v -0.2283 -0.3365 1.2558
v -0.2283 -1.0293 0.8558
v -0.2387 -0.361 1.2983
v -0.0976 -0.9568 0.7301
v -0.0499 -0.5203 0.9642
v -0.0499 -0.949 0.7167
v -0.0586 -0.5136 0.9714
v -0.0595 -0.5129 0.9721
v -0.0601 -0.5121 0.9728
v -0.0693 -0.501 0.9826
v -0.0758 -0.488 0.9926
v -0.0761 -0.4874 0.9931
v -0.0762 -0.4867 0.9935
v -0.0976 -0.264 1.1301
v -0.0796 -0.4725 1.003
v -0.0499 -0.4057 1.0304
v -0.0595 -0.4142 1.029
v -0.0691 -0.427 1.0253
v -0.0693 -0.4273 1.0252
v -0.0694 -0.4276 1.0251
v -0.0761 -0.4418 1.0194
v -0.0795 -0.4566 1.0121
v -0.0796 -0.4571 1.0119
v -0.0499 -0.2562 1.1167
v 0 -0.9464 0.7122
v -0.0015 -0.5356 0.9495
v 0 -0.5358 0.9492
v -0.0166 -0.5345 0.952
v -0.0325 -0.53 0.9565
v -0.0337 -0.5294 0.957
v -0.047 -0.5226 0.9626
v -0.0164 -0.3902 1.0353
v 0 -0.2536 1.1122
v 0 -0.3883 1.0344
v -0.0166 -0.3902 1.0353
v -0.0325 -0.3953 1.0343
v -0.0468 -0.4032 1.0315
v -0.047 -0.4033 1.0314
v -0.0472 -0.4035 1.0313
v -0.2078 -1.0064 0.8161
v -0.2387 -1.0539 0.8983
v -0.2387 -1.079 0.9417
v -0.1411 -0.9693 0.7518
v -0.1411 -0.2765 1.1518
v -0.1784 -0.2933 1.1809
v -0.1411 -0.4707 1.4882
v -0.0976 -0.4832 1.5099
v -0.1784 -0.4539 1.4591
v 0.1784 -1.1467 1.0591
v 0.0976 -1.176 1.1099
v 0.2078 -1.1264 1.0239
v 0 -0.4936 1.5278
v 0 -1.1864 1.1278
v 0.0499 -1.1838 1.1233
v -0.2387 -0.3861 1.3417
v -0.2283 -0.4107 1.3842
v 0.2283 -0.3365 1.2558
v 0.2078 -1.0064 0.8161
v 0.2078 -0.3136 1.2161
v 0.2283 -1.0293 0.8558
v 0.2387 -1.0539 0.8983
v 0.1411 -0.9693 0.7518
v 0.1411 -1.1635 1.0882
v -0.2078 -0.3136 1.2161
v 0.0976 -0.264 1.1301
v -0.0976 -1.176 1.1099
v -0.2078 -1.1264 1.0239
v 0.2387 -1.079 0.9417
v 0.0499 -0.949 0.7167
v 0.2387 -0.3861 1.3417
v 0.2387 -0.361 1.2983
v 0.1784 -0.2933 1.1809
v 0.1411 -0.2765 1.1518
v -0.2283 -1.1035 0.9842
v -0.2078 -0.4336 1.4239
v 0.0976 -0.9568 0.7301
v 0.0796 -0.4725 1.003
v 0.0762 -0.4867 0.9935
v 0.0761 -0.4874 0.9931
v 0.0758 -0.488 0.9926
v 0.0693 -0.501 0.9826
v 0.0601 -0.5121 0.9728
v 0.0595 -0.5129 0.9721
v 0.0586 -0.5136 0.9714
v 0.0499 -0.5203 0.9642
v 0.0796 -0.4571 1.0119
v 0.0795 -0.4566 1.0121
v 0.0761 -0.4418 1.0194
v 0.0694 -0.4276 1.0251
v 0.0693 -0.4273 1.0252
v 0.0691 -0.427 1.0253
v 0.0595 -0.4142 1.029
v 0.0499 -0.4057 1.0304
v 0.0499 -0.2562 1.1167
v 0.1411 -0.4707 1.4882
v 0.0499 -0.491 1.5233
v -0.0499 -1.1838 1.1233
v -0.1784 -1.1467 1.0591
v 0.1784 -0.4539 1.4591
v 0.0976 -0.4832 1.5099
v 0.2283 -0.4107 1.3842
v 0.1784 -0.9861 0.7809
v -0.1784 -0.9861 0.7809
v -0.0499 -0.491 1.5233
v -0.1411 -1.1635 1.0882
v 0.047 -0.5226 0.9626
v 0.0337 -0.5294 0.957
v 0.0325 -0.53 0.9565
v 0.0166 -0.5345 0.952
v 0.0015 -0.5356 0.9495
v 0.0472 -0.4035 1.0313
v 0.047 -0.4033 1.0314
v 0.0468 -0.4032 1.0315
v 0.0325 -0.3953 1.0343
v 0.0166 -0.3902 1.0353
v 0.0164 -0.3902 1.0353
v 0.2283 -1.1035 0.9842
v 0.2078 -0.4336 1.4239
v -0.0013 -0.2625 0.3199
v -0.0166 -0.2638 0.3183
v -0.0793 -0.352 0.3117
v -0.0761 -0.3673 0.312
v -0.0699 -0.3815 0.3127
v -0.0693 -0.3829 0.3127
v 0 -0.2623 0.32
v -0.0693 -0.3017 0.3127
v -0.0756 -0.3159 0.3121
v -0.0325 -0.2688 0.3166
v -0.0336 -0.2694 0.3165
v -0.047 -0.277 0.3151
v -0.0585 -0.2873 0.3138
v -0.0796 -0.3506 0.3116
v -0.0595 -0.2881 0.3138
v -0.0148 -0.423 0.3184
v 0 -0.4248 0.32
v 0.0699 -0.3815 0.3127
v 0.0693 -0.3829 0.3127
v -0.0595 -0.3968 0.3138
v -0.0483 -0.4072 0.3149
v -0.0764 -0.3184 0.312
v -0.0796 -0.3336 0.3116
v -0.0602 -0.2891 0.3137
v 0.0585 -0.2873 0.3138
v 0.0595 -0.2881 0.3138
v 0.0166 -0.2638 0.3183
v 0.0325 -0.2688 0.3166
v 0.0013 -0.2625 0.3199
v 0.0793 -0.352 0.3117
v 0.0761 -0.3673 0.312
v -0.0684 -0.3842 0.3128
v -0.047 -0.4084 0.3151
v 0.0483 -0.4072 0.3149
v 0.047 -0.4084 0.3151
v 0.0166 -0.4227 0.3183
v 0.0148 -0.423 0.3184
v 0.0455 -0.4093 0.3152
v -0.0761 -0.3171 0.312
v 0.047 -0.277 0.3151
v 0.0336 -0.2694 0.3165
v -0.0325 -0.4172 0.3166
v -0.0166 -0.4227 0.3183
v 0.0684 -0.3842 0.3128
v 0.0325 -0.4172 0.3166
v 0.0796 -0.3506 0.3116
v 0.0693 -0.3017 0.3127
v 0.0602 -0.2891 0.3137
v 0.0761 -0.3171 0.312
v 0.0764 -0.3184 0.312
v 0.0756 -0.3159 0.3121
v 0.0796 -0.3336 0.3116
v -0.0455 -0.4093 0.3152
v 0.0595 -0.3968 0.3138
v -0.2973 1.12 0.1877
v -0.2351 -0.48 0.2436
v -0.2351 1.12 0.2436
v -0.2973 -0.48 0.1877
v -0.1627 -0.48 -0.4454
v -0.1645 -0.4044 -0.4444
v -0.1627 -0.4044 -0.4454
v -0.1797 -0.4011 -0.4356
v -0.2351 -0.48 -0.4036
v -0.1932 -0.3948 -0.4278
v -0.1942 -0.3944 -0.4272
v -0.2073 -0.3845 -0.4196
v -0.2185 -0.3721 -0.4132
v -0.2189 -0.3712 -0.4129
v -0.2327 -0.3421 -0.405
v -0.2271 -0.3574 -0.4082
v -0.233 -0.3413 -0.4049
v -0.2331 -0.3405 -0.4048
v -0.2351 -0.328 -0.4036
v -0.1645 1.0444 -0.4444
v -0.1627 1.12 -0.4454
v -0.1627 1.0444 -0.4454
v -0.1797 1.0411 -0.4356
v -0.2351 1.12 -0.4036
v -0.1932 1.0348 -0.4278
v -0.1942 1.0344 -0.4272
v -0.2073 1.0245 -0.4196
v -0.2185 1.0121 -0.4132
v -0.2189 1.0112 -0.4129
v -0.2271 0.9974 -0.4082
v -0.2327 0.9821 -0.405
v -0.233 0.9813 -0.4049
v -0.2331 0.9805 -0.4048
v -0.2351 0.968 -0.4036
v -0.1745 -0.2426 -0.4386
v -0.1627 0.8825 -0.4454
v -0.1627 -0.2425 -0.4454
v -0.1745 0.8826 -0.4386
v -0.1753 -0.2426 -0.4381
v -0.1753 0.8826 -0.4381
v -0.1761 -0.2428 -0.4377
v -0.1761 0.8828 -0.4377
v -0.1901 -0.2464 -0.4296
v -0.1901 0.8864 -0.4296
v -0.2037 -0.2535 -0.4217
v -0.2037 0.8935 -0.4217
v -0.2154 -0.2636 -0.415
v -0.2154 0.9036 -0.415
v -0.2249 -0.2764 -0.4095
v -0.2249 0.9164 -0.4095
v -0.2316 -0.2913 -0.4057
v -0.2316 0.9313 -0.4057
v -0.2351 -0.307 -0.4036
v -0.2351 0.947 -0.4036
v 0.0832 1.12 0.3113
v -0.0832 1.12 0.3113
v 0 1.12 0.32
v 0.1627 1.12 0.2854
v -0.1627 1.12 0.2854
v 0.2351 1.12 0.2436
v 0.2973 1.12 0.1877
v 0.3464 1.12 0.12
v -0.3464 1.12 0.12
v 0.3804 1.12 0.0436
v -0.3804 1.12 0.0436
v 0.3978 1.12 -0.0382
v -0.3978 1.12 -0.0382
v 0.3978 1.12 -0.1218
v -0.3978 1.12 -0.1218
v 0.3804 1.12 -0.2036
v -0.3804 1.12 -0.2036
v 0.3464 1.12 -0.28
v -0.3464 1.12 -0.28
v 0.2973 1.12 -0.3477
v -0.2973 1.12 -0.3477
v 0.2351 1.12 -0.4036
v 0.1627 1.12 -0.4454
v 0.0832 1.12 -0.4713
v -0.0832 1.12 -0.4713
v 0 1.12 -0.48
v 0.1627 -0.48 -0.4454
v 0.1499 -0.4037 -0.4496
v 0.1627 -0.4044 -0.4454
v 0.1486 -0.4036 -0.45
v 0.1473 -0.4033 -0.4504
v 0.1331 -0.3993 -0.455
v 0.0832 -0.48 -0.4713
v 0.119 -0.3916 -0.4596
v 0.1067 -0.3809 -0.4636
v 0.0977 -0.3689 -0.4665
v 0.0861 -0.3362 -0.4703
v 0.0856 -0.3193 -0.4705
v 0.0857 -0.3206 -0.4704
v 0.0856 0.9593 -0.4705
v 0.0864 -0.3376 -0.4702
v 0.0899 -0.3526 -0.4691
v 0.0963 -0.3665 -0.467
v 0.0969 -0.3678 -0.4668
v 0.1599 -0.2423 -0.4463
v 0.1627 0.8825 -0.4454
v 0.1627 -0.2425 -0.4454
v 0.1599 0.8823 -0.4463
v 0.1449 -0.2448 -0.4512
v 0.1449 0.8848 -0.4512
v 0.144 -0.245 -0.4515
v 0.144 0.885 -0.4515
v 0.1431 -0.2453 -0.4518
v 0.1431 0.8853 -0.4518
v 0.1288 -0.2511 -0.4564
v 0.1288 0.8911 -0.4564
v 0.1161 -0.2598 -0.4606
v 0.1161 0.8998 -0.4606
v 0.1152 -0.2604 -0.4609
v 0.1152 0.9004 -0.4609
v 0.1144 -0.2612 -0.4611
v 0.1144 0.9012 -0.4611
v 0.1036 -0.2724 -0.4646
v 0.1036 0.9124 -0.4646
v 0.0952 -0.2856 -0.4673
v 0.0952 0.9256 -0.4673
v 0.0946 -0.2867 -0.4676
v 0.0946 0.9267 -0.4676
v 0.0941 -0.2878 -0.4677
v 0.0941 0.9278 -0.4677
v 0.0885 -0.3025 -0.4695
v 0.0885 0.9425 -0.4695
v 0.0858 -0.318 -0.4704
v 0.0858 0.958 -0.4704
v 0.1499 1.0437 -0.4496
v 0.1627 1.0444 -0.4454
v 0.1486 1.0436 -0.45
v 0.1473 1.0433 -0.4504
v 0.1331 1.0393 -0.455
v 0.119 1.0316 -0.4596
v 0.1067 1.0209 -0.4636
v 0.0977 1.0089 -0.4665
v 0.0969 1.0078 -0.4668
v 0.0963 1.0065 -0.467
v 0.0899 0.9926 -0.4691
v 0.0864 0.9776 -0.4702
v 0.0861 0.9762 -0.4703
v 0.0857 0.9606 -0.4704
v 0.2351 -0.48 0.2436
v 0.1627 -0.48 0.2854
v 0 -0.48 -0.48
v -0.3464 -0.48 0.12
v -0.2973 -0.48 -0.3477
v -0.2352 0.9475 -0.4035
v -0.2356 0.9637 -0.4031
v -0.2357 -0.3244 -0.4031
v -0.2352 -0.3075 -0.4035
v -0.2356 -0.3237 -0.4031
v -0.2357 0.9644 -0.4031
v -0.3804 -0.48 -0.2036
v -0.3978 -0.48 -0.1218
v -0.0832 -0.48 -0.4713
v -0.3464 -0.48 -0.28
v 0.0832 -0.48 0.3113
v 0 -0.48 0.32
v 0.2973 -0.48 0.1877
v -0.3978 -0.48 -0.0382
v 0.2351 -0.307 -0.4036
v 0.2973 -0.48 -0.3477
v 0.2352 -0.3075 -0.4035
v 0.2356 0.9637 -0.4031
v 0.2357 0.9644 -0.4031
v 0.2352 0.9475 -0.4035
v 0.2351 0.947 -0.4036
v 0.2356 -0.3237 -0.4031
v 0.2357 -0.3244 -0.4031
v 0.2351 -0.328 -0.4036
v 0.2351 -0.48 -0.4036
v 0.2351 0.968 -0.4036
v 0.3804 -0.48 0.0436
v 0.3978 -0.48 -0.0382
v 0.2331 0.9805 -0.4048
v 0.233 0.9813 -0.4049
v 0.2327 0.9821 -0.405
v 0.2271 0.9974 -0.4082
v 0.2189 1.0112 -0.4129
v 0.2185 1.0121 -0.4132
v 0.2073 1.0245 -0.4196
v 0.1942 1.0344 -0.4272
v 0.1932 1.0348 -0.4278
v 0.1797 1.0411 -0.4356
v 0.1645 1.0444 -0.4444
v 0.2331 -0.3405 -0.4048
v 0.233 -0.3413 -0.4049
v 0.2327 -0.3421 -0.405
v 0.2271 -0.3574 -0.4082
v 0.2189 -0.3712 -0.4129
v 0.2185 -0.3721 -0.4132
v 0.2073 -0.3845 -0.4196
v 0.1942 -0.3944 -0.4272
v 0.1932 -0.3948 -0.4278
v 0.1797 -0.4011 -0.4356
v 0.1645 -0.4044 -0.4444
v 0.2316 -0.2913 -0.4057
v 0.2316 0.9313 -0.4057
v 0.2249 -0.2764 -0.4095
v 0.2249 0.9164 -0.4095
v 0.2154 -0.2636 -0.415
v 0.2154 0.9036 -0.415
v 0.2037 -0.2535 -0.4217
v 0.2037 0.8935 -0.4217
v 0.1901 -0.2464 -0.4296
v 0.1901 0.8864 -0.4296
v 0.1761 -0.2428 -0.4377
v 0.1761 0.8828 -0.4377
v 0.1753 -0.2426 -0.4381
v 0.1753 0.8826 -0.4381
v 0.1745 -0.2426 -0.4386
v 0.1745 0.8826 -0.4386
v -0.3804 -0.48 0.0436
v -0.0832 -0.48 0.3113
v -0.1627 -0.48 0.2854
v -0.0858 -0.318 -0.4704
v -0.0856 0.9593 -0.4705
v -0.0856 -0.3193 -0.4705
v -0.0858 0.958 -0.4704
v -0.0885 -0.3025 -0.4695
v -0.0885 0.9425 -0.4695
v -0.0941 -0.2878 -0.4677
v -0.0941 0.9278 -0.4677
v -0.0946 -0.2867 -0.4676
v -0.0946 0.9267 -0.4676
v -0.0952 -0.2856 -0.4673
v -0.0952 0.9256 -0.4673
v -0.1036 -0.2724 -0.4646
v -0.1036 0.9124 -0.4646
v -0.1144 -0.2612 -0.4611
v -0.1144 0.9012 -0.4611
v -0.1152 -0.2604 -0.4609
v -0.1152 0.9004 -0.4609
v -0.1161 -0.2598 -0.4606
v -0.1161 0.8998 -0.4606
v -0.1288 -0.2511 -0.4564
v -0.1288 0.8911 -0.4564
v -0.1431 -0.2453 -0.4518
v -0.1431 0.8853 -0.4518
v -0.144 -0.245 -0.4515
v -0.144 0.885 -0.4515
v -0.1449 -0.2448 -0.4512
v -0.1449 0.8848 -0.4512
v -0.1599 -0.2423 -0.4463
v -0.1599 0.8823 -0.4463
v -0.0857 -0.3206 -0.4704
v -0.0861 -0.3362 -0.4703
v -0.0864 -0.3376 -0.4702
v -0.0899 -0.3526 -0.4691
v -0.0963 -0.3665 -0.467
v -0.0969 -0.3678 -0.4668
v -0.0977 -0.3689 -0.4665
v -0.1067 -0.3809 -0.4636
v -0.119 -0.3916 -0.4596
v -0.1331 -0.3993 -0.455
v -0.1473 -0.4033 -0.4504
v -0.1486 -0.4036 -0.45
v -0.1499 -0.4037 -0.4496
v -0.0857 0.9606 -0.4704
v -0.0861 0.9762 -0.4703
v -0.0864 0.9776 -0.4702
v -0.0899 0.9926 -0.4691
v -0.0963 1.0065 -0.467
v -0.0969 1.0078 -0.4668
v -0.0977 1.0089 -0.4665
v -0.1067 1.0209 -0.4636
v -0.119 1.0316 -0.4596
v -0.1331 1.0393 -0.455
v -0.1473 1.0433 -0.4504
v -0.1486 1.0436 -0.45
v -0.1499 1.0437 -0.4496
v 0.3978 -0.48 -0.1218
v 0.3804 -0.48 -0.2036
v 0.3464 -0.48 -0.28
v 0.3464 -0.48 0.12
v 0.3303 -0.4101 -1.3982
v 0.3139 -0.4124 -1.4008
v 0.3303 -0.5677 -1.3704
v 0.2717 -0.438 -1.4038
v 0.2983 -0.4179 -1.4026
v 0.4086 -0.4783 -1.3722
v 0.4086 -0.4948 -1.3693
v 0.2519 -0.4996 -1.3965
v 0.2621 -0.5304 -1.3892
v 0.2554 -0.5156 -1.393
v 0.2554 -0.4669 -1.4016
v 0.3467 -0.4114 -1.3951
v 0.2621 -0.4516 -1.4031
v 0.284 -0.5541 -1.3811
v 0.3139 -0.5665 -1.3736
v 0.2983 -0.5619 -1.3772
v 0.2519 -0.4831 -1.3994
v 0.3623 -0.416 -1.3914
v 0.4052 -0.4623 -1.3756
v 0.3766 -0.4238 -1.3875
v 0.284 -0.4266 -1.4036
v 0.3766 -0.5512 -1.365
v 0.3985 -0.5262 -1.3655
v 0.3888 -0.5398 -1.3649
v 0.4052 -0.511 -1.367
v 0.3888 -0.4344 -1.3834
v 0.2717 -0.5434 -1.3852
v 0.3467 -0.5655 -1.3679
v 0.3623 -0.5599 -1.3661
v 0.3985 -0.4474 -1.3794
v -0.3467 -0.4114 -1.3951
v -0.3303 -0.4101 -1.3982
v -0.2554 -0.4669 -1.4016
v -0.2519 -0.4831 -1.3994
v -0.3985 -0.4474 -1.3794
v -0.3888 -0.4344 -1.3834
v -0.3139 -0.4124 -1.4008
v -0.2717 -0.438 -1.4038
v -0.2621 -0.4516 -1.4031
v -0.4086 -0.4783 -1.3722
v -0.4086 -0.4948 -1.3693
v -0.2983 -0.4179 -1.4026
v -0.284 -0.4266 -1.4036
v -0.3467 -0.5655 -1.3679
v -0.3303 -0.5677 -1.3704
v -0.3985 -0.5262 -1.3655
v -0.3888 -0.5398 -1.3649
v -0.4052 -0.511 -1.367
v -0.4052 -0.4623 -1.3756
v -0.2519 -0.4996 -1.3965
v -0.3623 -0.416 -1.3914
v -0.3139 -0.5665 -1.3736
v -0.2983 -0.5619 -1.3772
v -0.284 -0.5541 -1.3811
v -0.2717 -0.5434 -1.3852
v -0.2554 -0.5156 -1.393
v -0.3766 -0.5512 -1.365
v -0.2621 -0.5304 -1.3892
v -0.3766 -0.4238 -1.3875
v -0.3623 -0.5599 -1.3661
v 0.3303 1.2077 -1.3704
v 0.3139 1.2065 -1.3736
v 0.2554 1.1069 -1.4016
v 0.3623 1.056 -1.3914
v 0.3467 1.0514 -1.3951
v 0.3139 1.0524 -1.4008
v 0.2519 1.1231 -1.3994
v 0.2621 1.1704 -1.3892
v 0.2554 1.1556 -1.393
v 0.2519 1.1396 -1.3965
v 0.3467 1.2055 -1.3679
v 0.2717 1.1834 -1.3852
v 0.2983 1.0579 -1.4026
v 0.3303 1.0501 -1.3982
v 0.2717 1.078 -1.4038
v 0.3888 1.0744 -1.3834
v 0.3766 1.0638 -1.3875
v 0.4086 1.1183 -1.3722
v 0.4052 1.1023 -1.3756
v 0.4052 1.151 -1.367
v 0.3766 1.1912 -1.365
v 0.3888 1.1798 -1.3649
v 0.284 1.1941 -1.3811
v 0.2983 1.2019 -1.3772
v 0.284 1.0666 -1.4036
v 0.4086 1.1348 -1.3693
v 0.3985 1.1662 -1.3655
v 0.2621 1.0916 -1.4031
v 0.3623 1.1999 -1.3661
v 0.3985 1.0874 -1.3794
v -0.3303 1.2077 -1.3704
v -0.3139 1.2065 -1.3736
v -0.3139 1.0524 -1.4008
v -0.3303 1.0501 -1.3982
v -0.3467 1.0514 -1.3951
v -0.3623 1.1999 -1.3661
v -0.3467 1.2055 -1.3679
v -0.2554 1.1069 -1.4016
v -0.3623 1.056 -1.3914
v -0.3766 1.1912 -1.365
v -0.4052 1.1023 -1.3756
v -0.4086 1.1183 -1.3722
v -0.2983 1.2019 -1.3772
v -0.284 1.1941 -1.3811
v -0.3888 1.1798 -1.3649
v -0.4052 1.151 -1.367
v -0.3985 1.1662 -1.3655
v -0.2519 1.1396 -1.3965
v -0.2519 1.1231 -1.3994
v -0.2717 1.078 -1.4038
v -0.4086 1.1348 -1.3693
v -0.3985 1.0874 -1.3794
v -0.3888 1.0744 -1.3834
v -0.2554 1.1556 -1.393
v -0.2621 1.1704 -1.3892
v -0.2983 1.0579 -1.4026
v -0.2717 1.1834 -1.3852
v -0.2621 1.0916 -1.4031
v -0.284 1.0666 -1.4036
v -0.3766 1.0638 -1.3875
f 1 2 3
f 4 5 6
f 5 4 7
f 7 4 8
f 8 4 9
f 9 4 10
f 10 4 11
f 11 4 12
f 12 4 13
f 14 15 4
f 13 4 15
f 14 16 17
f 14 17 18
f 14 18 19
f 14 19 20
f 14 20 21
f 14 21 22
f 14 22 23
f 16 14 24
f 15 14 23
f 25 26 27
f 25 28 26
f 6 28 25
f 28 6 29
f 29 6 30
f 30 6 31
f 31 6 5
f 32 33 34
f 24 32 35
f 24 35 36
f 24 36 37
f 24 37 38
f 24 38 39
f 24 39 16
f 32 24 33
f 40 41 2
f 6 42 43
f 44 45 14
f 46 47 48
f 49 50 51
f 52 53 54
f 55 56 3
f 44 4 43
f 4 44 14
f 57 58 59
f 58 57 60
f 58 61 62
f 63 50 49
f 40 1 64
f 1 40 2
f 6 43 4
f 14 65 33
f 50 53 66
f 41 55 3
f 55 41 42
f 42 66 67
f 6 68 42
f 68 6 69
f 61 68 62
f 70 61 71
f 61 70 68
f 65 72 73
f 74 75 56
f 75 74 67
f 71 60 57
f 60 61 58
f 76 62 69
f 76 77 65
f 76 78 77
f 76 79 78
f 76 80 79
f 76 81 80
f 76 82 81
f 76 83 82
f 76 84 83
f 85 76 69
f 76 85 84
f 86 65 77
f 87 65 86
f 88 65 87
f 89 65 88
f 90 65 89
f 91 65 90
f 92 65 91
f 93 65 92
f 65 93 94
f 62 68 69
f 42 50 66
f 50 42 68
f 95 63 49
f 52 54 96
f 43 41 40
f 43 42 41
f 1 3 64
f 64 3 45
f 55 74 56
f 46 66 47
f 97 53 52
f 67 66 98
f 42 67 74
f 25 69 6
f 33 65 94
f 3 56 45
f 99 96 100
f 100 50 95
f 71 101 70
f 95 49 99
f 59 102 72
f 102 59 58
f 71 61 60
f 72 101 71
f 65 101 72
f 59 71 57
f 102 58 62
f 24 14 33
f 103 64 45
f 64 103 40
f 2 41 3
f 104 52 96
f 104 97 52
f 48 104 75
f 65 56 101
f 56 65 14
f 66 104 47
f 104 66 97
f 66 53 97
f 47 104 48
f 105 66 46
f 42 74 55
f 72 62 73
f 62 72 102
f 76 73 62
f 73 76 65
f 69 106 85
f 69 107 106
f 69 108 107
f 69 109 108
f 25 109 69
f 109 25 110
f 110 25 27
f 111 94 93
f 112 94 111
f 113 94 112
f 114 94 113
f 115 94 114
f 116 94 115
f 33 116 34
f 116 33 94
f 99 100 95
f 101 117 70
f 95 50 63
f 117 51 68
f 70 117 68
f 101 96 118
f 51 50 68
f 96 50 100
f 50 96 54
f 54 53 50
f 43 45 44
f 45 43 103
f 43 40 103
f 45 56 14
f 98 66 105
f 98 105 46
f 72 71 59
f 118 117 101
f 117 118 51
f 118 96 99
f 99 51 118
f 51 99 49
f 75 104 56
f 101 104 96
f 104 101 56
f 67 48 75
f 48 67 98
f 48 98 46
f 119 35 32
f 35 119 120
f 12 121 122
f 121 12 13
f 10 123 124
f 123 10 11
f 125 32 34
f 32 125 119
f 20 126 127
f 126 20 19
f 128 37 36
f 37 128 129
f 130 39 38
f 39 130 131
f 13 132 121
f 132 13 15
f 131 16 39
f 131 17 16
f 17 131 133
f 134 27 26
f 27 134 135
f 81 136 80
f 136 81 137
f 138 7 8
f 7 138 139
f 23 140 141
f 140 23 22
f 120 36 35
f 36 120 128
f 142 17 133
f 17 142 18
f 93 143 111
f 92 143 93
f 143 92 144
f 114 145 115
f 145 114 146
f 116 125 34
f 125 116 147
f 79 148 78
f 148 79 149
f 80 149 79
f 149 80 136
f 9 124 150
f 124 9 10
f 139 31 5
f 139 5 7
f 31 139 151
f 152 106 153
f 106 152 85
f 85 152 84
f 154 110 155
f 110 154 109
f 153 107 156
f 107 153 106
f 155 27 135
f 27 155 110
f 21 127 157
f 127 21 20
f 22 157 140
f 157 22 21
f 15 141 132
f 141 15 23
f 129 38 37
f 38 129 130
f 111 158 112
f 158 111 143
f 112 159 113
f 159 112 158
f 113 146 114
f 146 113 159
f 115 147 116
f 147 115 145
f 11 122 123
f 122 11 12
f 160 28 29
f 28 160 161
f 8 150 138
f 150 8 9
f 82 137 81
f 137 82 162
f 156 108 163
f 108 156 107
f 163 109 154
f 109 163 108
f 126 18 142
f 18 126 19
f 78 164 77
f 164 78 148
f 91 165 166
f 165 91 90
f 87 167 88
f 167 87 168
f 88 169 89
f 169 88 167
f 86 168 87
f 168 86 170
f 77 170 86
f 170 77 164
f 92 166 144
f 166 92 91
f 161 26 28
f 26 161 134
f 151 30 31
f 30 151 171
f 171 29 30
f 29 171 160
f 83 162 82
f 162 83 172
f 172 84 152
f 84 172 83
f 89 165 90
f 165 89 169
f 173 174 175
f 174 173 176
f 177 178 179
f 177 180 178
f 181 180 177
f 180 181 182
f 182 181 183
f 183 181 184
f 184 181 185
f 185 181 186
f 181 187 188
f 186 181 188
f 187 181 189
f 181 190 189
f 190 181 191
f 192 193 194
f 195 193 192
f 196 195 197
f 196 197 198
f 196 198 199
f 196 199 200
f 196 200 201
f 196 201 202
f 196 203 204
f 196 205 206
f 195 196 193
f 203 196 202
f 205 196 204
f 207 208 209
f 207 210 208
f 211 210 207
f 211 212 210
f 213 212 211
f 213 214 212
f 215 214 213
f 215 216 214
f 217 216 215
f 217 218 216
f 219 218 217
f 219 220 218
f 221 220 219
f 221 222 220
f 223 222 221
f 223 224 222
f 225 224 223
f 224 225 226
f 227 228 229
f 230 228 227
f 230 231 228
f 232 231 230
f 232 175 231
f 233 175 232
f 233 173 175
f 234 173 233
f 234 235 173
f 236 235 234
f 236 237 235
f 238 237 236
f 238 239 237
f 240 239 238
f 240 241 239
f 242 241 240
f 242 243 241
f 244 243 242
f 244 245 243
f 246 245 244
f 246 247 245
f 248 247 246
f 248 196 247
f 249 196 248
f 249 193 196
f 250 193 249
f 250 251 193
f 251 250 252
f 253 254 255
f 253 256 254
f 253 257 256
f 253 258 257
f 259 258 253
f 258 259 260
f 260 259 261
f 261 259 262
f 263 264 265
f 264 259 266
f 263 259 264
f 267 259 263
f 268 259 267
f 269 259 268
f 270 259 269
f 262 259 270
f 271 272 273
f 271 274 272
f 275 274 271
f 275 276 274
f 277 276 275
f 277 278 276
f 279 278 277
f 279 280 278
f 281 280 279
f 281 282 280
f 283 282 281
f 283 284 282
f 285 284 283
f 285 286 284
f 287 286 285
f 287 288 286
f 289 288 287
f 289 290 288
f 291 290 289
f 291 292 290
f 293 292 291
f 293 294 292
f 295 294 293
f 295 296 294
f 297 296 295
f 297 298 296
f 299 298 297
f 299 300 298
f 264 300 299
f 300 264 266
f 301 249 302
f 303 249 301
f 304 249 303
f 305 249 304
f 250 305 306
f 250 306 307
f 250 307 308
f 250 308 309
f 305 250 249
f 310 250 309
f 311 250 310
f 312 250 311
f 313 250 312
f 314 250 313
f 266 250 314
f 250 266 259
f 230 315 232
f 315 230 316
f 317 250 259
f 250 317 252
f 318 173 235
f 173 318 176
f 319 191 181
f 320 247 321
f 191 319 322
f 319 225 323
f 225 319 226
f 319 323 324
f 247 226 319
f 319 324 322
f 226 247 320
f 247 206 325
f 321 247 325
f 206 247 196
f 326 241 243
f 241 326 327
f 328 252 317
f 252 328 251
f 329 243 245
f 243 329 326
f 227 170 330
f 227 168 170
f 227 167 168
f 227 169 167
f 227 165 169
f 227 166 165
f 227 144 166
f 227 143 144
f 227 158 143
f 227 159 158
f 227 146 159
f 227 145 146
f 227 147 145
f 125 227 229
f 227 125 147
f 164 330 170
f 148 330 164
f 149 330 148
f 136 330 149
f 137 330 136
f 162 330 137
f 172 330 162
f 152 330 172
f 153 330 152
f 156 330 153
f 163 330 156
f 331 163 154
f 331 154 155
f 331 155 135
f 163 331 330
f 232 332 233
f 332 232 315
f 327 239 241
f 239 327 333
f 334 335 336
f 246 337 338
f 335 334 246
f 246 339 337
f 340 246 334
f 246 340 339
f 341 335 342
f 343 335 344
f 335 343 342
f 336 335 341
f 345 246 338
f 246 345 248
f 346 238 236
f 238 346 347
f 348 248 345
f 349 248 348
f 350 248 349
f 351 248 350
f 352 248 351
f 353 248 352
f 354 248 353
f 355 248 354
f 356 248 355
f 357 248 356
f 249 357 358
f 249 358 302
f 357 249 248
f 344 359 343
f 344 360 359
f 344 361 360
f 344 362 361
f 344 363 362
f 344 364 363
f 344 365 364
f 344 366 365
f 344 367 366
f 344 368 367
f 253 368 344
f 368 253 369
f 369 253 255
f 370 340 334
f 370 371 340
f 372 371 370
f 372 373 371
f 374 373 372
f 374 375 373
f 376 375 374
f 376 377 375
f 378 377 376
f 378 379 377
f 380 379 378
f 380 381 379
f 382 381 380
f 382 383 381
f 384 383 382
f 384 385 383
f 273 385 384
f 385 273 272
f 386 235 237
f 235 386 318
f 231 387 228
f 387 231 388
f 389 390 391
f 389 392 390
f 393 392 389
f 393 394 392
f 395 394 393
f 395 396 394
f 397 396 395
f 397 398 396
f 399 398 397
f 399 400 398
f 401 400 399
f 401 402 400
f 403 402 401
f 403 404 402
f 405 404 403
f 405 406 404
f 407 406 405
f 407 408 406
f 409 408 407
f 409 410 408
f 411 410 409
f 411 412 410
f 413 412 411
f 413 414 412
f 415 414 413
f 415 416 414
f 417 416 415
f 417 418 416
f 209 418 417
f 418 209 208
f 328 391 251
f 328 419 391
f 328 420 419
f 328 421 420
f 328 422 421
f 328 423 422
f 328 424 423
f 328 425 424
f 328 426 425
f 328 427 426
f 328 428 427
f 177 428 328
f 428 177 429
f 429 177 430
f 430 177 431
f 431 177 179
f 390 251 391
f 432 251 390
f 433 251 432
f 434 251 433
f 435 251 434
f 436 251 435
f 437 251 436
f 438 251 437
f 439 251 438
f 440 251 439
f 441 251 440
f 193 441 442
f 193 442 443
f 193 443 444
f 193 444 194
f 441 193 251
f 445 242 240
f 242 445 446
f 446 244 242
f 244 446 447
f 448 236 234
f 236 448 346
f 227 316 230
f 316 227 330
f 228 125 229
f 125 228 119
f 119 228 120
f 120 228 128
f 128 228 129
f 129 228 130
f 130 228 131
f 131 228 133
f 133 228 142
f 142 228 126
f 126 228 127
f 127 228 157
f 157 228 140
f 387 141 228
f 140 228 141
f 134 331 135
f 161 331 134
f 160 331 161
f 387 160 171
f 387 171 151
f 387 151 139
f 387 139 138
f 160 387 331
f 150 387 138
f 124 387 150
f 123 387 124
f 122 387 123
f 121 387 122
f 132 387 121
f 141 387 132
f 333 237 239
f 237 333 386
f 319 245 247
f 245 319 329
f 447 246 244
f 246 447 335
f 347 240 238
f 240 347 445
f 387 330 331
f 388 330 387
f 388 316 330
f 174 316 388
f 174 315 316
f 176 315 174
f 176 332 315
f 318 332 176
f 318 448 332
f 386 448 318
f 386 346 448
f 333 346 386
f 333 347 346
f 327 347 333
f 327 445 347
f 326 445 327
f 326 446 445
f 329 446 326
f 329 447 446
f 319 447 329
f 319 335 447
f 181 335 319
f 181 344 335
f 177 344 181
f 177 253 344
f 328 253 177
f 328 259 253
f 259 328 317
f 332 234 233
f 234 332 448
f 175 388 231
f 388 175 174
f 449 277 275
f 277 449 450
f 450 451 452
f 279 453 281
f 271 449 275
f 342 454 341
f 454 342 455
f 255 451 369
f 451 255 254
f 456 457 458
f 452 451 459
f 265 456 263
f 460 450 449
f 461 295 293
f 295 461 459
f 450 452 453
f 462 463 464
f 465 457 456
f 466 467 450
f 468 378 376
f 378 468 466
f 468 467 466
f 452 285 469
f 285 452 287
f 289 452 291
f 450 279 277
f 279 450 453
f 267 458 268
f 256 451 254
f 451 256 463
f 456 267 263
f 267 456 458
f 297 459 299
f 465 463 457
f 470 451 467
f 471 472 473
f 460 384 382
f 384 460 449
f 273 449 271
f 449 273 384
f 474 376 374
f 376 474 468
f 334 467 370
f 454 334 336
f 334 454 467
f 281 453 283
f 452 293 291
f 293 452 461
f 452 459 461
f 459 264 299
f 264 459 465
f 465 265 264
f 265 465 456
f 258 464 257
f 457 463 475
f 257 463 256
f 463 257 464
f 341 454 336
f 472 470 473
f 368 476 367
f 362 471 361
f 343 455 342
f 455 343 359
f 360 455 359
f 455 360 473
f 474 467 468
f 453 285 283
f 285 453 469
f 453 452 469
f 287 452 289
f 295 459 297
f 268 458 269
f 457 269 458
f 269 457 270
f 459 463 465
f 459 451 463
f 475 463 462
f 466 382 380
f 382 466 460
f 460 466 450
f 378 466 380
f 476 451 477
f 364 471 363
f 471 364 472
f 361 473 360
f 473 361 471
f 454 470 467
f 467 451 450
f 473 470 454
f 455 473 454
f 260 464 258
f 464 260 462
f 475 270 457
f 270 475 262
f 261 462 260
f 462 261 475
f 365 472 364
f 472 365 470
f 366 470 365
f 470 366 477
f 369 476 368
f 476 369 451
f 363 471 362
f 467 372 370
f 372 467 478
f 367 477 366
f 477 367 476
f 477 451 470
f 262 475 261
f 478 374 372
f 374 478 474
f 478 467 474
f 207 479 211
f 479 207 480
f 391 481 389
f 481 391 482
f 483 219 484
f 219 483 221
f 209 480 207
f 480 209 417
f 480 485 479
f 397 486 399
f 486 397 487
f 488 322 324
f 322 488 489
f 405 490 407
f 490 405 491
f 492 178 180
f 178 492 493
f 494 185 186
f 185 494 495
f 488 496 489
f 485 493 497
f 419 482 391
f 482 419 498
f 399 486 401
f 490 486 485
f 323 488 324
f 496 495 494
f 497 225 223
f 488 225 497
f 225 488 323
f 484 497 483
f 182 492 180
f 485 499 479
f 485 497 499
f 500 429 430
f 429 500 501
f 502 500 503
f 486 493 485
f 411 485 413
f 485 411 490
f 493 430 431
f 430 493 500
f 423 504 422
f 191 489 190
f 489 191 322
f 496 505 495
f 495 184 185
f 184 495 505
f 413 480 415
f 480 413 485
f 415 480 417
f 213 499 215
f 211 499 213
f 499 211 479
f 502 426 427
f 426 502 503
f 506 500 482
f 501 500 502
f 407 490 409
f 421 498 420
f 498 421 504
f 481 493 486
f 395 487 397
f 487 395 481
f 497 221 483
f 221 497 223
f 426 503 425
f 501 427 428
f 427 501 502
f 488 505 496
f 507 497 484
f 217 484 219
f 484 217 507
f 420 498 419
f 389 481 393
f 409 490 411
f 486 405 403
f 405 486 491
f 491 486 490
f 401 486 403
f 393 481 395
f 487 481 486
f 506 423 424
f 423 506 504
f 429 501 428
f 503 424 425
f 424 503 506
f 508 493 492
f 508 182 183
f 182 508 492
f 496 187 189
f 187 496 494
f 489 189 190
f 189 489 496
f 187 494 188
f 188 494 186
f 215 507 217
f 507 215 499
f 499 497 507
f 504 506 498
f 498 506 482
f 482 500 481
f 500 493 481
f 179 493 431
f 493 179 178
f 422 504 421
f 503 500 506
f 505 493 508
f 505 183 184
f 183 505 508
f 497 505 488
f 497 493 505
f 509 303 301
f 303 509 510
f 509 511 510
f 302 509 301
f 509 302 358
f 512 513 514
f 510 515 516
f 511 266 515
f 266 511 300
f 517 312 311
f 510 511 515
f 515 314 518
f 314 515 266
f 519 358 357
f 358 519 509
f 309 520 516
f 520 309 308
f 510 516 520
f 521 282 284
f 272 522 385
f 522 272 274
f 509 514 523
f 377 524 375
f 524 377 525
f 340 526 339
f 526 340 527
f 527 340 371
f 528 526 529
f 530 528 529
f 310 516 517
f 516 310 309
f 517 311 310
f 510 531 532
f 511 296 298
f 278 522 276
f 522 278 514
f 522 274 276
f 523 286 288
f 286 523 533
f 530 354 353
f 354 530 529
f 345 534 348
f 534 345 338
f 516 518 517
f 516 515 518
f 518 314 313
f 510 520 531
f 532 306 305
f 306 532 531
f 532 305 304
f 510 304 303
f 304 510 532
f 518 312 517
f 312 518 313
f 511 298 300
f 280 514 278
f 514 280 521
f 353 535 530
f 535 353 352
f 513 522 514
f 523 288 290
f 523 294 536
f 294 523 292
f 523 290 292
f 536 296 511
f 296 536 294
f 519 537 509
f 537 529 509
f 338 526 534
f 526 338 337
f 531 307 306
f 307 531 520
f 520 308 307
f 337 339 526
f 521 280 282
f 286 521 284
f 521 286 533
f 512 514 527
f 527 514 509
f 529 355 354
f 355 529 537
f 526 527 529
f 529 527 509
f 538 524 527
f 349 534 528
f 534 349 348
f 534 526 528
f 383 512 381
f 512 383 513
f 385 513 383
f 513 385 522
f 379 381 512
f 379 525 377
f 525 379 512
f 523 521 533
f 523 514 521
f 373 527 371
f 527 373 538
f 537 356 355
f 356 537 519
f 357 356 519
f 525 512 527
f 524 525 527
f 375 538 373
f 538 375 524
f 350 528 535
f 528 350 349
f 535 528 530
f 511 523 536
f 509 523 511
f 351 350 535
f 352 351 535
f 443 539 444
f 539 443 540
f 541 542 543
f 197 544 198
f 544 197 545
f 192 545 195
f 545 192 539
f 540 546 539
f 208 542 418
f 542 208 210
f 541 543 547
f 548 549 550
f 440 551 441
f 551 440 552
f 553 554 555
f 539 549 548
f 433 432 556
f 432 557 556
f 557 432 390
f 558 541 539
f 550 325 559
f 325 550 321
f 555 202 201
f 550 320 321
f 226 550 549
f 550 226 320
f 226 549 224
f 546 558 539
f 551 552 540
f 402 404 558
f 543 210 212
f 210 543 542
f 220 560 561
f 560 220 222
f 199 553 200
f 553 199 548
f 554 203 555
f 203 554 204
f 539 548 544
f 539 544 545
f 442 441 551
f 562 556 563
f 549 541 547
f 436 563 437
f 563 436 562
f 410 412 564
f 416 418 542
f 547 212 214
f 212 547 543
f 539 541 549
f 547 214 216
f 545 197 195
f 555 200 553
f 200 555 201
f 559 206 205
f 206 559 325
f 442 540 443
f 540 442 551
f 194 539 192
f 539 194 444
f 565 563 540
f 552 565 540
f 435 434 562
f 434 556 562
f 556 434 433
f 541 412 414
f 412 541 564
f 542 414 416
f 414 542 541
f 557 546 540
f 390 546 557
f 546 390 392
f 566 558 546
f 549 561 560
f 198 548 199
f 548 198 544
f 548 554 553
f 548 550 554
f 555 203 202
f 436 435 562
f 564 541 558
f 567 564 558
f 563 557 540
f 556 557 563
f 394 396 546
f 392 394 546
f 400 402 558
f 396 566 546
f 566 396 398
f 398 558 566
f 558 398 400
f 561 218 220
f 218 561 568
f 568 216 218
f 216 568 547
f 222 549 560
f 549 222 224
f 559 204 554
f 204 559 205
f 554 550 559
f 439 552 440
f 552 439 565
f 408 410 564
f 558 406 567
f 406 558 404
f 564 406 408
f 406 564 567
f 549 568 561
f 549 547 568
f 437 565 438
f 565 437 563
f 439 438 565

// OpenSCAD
font = "Liberation Sans";

dl=0.1;  //cm
dc=0.01; //cm espessura da camada de chumbo

dz=0.1;  // largura da linha
z=1.5;

module Cavalo() {
    scale([0.8,0.8,0.8]) translate([0,0.4,-0.1]) rotate([0,0,90]) union() {
        translate([-0.9,0,0.9]) {
            translate([-0.4,0,0.6]) rotate([0,60,0])
                cylinder(h=1,r=0.3,center=true,$fn=30);
            rotate([0,-10,0])
                cylinder(h=1,r=0.1,center=true,$fn=30);
        }
        rotate([0,90,0])
            cylinder(h=2,r=0.5,center=true,$fn=30);
        translate([-0.9,-0.3,-1])
            rotate([-10,10,0])
                cylinder(h=1.3,r=0.1,center=true,$fn=30);
        translate([-0.9,0.3,-1])
            rotate([10,10,0])
                cylinder(h=1.3,r=0.1,center=true,$fn=30);
        translate([0.9,-0.3,-1])
            rotate([-10,-10,0])
                cylinder(h=1.3,r=0.1,center=true,$fn=30);
        translate([0.9,0.3,-1])
            rotate([10,-10,0])
                cylinder(h=1.3,r=0.1,center=true,$fn=30);
    }
}
module Base() {
    // base de acrílico
    translate([dl/2,0,0]) color("gray",alpha=0.15) cube([dl,3,4],true);
}

//Base();
Cavalo();
